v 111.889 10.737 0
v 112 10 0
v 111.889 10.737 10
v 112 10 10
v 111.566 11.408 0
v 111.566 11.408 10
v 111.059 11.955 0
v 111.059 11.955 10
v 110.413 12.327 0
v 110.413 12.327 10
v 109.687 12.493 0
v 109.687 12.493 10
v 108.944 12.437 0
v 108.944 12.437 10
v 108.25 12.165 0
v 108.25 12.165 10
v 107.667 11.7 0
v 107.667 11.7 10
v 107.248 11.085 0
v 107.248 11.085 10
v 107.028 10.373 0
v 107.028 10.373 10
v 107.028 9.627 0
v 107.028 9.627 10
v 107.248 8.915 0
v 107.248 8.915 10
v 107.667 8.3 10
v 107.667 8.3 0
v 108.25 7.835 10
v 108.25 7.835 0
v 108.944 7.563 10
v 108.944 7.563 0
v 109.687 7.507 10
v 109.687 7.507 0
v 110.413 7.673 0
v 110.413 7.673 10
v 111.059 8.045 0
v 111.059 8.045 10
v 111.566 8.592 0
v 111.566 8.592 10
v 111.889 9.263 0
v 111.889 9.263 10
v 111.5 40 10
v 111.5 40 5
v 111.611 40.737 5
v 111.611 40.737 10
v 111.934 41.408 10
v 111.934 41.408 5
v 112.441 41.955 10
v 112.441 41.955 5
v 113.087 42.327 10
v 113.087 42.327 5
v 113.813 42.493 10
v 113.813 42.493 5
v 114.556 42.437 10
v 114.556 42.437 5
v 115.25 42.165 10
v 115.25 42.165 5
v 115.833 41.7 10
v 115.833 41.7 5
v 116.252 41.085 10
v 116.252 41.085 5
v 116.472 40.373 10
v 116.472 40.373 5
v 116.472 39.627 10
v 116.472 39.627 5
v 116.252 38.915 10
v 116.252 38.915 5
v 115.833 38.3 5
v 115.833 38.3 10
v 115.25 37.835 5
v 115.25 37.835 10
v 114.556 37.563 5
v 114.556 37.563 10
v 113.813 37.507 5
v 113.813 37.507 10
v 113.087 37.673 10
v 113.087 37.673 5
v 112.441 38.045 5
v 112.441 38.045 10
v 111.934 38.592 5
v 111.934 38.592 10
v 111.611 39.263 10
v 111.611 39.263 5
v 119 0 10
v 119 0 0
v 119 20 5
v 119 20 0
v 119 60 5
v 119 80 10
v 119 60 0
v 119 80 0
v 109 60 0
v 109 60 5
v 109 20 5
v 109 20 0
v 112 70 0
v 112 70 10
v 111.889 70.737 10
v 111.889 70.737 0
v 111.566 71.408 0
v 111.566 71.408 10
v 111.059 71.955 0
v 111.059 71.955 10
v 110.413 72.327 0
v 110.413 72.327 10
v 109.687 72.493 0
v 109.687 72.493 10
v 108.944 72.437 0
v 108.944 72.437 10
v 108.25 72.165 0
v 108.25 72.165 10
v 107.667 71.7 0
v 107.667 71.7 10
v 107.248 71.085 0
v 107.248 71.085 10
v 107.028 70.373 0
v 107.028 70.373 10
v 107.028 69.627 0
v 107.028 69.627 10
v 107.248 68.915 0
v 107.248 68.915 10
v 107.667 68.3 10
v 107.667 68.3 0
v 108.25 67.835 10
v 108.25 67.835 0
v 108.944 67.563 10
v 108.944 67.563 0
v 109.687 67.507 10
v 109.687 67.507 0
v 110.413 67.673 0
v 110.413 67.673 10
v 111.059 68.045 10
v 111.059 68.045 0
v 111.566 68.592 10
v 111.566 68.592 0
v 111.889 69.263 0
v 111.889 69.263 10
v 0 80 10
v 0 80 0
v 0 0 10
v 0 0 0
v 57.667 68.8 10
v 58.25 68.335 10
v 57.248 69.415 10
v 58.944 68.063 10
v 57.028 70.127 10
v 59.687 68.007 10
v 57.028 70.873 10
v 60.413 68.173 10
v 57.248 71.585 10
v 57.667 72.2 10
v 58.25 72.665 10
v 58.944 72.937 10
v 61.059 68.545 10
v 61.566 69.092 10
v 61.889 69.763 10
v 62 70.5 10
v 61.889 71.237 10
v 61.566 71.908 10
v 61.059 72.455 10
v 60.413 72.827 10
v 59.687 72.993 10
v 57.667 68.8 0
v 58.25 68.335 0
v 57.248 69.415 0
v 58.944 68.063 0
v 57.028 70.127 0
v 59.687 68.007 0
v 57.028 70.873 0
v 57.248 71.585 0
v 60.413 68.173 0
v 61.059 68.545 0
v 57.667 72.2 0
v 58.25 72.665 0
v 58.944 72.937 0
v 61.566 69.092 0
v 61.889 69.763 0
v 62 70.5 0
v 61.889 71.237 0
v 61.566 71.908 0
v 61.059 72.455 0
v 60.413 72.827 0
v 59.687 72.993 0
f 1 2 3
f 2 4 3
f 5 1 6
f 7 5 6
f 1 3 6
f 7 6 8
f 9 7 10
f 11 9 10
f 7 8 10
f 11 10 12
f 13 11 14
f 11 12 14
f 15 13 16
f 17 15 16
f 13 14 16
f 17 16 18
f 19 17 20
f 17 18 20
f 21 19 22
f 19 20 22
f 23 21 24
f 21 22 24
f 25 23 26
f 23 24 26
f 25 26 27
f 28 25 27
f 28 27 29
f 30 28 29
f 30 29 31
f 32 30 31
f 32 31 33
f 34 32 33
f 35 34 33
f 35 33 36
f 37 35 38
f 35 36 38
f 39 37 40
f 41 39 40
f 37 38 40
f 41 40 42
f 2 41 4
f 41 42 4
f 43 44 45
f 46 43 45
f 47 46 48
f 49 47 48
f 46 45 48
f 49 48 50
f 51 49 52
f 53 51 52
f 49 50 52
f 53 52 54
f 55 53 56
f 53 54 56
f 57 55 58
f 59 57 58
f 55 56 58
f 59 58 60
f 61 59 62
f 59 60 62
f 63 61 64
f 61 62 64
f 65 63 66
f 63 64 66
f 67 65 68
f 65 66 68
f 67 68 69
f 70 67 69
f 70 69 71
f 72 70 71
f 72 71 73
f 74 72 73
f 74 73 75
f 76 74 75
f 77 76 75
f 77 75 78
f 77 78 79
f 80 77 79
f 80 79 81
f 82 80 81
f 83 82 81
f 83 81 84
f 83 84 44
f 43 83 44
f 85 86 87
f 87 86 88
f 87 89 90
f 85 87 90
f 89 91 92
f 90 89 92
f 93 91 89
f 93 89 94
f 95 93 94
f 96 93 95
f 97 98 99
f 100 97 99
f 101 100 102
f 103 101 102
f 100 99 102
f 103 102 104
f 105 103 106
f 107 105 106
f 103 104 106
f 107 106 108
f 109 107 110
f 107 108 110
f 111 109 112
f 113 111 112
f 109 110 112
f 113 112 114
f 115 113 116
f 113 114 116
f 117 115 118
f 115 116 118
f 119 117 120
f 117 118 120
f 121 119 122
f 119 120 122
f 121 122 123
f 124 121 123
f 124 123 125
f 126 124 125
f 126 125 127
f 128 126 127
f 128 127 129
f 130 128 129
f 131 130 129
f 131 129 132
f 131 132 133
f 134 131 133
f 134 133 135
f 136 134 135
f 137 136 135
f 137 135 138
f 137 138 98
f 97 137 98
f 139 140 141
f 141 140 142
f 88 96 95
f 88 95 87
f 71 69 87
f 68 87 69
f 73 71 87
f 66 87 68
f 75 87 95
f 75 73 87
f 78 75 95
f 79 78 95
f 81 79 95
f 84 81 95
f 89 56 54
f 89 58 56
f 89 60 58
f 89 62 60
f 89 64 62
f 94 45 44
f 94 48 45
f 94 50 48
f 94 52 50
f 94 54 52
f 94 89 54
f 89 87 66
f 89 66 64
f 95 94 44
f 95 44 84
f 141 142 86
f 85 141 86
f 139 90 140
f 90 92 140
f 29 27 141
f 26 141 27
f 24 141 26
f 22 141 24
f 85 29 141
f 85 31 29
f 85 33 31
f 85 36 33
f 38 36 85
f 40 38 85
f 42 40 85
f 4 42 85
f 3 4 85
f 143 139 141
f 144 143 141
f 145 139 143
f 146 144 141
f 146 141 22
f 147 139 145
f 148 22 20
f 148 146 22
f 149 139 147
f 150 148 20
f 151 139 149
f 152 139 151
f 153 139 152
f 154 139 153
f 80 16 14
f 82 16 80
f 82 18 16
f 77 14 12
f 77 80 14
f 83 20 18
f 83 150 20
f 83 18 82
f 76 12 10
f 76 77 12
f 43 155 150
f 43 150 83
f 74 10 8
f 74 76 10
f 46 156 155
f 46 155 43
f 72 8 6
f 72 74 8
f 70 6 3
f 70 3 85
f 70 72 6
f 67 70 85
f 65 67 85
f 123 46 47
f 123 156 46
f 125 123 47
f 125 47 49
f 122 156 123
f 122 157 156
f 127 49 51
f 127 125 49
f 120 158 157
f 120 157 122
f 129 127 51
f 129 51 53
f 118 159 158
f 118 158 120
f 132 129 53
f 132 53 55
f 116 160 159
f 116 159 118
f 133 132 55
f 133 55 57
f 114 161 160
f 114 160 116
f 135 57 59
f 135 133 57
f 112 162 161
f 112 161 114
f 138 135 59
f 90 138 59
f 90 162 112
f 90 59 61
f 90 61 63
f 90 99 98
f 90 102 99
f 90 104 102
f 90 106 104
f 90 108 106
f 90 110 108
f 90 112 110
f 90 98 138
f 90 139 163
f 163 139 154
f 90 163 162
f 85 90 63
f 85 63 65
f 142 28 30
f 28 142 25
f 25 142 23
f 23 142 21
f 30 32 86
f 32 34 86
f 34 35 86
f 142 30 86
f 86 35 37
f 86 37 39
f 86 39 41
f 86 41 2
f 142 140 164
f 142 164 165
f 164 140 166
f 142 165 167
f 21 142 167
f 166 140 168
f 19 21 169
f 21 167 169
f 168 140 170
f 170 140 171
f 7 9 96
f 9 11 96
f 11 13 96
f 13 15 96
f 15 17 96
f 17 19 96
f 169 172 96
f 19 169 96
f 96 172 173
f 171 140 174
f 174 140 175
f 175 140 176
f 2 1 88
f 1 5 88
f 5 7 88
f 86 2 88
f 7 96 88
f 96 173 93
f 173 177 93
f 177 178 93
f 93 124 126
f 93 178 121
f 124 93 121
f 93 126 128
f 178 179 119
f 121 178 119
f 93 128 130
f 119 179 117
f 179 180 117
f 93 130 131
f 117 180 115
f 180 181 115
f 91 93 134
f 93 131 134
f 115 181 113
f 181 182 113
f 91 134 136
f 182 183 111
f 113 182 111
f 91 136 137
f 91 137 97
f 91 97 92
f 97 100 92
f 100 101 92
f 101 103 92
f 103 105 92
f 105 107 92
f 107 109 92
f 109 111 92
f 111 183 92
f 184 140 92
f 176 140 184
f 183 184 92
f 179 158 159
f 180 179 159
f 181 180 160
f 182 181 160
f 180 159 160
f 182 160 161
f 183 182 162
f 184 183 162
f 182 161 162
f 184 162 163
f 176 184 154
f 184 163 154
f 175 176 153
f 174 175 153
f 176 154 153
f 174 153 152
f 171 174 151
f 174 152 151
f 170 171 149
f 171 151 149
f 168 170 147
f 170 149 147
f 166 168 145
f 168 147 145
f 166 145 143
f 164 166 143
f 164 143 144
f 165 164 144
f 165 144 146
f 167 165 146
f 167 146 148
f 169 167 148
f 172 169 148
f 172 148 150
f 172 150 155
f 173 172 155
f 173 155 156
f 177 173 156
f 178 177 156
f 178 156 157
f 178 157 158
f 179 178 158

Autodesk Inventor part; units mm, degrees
ref_plane "YZ Plane" through (0, 0, 0) normal (1, 0, 0) x (0, 1, 0)
ref_plane "XZ Plane" through (0, 0, 0) normal (0, 1, 0) x (-1, 0, 0)
ref_plane "XY Plane" through (0, 0, 0) normal (0, 0, 1) x (1, 0, 0)
sketch "Sketch1" plane through (0, 0, 0) normal (0, 0, 1) x (1, 0, 0)
  line L0 (0, 0) -> (119, 0)
  line L1 (119, 0) -> (119, 80)
  line L2 (119, 80) -> (0, 80)
  line L3 (0, 80) -> (0, 0)
  dimension "d0" = 119
  dimension "d1" = 80
extrude "Extrusion1" add sketch "Sketch1" along normal blind 10
sketch "Sketch2" plane through (0, 0, 10) normal (0, 0, 1) x (1, 0, 0)
  circle A0 centre (109.5, 70) radius 2.5
  circle A1 centre (109.5, 10) radius 2.5
  line L0 (119, 80) -> (0, 80) projected
  line L1 (119, 0) -> (119, 80) projected
  point P0 (0, 0)
  dimension "d4" = 5
  dimension "d5" = 5
  dimension "d6" = 10
  dimension "d7" = 60
  dimension "d8" = 9.5
extrude "Extrusion2" cut sketch "Sketch2" against normal through all
sketch "Sketch3" plane through (0, 0, 0) normal (0, 0, -1) x (-1, 0, 0)
  line L0 (-119, 0) -> (-119, 80) projected
  line L1 (-119, 60) -> (-109, 60)
  line L2 (-109, 60) -> (-109, 20)
  line L3 (-109, 20) -> (-119, 20)
  line L4 (-119, 20) -> (-119, 60)
  line L5 (-119, 80) -> (0, 80) projected
  point P0 (0, 0)
  dimension "d11" = 10
  dimension "d12" = 40
  dimension "d13" = 20
extrude "Extrusion3" cut sketch "Sketch3" against normal blind 5
sketch "Sketch4" plane through (0, 0, 5) normal (0, 0, -1) x (-1, 0, 0)
  line L0 (-109, 60) -> (-119, 60)
  line L1 (-119, 60) -> (-119, 20)
  line L2 (-119, 20) -> (-109, 20)
  line L3 (-109, 20) -> (-109, 60)
  line L4 (-119, 80) -> (0, 80) projected
  line L5 (-119, 0) -> (-119, 80) projected
  circle A0 centre (-114, 40) radius 2.5
  point P0 (0, 0)
  point P1 (-119, 20)
  point P2 (-119, 40)
  point P3 (-114, 60)
  point P4 (-119, 40)
  dimension "d18" = 10
  dimension "d19" = 40
  dimension "d20" = 20
  dimension "d21" = 5
extrude "Extrusion4" cut sketch "Sketch4" against normal through all contours A0
sketch "Sketch5" plane through (0, 0, 10) normal (0, 0, 1) x (1, 0, 0)
  circle A0 centre (59.5, 70.5) radius 2.5
  line L0 (119, 80) -> (0, 80) projected
  point P0 (0, 0)
  point P1 (59.5, 80)
  dimension "d24" = 5
  dimension "d25" = 9.5
extrude "Extrusion5" cut sketch "Sketch5" against normal through all
properties part number "SP004" material "ABS Plastic"
